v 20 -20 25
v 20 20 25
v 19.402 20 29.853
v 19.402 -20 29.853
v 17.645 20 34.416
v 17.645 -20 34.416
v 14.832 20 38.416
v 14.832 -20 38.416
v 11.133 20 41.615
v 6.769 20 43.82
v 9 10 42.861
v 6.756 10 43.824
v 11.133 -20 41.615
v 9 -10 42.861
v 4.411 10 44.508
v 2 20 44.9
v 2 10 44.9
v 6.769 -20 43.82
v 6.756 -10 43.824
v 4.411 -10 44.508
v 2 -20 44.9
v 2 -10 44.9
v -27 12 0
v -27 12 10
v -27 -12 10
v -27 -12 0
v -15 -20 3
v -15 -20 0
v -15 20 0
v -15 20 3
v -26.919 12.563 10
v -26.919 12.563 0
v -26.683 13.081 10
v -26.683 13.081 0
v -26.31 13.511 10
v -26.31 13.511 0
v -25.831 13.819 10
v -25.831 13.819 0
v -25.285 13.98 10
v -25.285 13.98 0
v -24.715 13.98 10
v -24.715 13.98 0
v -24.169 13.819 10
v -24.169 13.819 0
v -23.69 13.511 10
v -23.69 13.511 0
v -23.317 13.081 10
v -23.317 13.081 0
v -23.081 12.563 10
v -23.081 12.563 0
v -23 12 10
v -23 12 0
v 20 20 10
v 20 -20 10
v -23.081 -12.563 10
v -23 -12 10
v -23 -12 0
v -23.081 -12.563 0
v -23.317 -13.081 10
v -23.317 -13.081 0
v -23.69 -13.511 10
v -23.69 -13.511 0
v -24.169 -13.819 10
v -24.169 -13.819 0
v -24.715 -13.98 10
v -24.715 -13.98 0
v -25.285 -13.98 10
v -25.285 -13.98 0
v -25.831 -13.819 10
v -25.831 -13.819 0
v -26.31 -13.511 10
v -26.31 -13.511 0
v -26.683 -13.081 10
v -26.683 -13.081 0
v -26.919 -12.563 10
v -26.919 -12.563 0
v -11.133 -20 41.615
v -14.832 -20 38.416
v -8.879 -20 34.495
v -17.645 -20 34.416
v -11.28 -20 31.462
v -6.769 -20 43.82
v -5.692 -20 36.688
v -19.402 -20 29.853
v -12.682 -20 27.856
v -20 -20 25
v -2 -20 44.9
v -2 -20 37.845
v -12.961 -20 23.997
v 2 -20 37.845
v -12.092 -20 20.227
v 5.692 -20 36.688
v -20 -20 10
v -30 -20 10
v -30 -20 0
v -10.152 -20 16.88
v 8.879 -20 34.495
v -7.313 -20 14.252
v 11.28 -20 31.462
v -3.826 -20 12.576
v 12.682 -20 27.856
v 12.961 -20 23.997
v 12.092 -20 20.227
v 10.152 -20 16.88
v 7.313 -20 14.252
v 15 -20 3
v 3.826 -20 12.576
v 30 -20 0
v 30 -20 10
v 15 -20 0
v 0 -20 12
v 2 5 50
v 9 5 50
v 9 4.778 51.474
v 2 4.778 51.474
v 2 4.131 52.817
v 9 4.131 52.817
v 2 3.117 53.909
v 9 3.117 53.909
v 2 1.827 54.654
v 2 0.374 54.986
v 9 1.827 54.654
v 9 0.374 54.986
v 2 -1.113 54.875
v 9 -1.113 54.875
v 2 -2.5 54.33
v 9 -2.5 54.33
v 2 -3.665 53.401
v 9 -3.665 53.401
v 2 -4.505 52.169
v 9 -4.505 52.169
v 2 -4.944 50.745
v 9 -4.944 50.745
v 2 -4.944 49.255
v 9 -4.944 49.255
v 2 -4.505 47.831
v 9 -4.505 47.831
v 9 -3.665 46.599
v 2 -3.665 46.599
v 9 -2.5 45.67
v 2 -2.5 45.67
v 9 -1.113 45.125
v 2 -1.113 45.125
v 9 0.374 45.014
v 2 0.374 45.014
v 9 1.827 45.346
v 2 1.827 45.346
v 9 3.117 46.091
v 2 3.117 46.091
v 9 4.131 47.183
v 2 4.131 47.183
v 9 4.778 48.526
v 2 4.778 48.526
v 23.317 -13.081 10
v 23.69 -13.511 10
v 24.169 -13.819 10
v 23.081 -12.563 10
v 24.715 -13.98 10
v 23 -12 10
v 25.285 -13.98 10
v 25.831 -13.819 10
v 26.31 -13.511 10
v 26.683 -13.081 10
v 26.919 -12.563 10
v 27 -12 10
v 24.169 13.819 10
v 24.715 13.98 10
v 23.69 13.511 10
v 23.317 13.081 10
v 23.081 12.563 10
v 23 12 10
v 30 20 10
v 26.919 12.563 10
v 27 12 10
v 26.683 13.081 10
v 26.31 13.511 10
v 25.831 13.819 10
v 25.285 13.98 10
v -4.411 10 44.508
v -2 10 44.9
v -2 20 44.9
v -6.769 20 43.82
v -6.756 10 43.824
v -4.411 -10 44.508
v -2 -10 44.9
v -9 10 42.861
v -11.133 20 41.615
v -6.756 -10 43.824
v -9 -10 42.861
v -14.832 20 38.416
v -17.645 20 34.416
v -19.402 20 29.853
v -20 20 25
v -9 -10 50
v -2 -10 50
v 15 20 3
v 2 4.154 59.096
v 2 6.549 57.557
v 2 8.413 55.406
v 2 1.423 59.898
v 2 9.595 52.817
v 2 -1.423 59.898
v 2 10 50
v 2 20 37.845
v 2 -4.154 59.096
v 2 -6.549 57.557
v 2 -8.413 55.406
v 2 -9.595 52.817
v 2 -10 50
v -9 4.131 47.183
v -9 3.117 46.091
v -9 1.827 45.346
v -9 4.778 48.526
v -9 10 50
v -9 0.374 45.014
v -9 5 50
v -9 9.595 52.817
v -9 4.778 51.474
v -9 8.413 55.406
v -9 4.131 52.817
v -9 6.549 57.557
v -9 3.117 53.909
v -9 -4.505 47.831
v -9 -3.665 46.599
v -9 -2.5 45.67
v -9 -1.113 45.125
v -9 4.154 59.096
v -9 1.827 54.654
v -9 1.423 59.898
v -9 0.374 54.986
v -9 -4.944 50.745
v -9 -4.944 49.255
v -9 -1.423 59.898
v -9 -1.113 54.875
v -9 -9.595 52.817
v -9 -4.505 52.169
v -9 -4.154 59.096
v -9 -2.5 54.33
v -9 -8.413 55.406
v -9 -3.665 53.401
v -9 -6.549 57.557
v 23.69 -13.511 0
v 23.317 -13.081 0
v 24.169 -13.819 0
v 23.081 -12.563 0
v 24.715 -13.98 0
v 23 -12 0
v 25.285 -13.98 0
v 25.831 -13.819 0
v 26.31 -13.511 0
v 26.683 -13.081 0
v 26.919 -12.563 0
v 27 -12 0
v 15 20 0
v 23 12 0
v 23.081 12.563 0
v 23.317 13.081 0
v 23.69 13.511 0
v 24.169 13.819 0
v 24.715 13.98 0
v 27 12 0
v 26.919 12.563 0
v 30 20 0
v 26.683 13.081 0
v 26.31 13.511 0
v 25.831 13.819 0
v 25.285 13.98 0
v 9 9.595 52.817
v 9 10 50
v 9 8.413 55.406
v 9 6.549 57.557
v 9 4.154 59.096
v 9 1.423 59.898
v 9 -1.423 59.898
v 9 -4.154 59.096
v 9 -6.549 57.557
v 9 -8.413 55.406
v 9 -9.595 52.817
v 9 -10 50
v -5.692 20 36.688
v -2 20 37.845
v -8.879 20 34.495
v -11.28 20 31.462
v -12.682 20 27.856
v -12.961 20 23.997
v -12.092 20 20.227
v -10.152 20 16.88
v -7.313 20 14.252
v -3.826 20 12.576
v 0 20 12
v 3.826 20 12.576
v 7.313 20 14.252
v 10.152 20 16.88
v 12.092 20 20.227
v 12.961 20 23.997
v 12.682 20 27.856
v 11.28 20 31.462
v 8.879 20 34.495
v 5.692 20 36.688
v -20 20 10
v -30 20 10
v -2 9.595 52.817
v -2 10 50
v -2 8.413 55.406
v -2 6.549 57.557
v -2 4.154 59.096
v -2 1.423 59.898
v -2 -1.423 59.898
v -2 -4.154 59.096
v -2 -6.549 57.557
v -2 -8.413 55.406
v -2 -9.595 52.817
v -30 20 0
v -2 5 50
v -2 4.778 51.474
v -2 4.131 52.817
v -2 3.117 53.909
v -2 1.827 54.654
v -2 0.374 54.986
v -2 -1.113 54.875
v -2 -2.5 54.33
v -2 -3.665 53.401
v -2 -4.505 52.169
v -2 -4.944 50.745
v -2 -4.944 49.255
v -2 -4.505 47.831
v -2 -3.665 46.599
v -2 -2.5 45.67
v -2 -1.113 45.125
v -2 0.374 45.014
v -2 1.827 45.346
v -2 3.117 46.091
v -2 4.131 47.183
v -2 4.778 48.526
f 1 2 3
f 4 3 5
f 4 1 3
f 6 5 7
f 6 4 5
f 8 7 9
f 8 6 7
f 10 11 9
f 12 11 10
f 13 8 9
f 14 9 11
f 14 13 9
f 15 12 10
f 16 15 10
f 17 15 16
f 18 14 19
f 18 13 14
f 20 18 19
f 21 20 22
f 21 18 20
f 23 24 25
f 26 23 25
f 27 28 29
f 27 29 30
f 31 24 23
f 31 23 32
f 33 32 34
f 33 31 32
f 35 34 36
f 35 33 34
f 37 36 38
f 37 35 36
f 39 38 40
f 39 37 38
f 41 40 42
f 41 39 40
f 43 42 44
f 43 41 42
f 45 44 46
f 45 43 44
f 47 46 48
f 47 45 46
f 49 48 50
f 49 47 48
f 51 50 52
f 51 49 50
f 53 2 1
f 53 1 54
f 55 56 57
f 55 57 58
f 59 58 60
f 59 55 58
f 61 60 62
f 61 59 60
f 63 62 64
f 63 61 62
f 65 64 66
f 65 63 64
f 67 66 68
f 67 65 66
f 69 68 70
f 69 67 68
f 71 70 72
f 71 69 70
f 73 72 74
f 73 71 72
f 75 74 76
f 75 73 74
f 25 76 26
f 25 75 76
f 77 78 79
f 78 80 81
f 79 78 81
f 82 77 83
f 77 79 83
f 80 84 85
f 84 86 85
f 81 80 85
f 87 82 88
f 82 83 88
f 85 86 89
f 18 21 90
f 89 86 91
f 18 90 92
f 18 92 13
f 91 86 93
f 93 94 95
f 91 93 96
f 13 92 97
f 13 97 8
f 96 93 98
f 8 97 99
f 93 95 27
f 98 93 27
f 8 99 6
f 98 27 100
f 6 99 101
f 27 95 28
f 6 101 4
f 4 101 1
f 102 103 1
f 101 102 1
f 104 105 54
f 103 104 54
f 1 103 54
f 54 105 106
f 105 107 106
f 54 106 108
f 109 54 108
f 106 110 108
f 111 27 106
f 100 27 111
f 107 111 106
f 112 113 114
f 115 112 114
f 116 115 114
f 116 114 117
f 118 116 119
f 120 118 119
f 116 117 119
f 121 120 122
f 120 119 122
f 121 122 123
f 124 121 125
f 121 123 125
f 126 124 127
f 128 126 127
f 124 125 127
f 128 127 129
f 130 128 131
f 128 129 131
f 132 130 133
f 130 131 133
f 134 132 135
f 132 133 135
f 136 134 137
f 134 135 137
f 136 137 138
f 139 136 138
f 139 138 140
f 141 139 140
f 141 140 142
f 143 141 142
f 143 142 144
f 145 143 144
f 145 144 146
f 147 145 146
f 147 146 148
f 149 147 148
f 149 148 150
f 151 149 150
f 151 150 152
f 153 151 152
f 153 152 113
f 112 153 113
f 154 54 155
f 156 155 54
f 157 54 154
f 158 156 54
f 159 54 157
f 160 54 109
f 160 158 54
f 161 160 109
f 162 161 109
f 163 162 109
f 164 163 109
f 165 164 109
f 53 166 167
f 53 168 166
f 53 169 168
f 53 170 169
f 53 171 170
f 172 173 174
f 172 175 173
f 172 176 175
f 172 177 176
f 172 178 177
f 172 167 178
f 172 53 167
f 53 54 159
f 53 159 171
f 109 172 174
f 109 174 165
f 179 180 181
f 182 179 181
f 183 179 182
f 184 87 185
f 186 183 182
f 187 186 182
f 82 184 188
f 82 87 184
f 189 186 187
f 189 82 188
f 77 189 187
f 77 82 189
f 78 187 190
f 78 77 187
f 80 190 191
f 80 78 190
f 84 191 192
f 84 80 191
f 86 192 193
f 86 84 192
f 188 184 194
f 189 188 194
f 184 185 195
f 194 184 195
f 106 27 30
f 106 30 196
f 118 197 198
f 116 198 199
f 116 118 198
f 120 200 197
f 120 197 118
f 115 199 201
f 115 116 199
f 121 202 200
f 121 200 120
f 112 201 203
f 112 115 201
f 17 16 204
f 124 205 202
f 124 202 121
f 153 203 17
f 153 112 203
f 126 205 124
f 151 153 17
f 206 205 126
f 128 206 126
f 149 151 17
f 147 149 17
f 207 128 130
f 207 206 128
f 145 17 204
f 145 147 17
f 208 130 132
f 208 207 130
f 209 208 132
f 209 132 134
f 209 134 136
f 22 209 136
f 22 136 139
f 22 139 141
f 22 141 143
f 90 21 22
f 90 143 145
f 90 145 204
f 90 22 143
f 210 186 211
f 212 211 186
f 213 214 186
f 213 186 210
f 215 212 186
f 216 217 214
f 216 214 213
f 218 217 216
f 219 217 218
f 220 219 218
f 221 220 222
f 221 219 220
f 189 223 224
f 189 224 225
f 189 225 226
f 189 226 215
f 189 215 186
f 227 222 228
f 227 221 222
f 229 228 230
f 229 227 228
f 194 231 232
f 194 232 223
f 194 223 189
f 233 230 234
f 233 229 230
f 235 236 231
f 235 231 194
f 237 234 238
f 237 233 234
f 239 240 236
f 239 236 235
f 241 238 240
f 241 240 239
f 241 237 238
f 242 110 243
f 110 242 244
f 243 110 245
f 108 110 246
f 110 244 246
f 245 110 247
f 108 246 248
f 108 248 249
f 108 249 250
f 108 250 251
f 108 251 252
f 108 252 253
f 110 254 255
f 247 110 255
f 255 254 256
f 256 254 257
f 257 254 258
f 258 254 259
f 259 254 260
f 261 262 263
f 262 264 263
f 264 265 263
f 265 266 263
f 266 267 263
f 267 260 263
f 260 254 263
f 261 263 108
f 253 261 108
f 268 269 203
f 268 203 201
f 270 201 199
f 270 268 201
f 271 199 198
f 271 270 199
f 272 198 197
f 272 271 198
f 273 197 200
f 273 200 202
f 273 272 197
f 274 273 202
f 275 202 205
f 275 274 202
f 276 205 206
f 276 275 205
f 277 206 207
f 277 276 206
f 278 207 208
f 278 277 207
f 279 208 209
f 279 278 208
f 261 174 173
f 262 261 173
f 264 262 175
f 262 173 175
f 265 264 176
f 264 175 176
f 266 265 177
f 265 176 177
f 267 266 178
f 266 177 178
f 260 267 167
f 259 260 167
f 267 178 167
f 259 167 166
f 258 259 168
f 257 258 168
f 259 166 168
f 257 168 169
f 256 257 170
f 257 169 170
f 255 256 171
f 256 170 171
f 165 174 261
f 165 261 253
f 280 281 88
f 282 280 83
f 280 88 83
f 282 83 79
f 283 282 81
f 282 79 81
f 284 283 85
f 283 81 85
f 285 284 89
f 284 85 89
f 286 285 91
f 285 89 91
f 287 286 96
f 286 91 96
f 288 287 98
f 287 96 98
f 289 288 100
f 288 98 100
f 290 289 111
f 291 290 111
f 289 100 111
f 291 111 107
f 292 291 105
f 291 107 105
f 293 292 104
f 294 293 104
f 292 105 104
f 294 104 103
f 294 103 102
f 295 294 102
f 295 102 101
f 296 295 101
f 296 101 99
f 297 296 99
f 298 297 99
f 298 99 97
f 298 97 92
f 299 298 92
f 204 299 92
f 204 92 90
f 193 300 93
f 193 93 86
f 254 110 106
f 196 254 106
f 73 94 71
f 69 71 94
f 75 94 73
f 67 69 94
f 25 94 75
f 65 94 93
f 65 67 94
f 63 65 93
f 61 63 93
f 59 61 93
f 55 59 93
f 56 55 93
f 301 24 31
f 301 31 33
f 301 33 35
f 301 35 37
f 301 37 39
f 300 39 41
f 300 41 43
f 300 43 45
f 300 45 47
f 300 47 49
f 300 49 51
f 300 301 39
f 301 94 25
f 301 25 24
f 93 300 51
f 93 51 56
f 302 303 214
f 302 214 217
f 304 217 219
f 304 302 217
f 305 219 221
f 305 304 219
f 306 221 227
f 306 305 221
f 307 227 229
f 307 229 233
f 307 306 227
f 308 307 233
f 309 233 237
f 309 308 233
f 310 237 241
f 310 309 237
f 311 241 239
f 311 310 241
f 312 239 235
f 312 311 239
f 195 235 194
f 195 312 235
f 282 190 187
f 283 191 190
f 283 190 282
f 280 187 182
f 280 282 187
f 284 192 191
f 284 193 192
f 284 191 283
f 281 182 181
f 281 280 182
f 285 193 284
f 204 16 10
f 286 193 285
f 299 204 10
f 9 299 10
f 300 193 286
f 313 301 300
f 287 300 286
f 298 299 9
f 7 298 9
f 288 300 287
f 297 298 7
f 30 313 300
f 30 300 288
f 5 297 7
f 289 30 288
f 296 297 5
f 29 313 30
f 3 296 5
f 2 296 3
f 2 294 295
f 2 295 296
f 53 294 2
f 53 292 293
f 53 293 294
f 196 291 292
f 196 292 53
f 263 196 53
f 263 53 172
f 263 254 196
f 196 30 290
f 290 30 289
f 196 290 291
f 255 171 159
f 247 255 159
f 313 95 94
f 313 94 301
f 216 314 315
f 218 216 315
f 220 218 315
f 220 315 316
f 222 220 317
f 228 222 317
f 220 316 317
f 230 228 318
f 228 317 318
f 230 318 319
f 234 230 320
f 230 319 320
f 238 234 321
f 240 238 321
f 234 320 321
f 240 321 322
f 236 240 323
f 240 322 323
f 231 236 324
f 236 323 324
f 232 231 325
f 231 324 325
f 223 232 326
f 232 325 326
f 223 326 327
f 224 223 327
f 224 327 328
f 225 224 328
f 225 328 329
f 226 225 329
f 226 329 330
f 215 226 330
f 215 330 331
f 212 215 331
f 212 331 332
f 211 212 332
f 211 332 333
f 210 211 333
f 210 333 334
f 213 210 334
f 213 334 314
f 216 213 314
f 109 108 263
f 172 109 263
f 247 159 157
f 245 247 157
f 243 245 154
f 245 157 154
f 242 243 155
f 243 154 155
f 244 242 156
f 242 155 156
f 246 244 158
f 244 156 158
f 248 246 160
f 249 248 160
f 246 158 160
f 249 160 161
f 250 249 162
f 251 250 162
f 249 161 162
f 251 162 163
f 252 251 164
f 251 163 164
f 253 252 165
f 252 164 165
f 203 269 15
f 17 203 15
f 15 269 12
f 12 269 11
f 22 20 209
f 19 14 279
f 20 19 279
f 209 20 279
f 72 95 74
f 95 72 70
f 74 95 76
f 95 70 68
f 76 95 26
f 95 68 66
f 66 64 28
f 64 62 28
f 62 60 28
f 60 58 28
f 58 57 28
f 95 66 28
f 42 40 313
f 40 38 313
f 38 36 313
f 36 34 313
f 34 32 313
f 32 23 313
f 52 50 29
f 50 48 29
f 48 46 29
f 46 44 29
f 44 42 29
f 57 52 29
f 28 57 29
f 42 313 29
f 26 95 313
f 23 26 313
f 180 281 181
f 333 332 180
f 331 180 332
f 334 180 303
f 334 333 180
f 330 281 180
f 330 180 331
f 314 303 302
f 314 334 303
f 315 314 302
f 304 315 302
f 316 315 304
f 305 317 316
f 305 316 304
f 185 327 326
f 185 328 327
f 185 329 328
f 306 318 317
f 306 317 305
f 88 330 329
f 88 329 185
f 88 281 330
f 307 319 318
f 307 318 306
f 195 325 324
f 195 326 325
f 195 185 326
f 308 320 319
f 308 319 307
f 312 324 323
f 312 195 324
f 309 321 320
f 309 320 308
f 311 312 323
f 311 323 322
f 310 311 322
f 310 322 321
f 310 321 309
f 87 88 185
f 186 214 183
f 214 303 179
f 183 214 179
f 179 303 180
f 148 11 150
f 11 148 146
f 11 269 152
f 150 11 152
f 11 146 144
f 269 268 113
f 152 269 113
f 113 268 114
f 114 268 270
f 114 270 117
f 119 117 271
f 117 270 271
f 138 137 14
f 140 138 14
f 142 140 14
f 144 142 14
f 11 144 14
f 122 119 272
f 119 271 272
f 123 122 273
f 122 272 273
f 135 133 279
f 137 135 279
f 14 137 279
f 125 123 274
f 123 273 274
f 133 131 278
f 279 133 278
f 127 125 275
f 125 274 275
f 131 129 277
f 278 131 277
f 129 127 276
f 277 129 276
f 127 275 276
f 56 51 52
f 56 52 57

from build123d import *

# Parameters (mm, degrees)
SKETCH_W        = 60
SKETCH_H        = 40
PAD_DEPTH       = 10
PAD001_DEPTH    = 20
PAD002_DEPTH    = 9
SKETCH003_R     = 5
POCKET_DEPTH    = 39.001
POCKET001_DEPTH = 40.001
POCKET002_DEPTH = 197.61763
SKETCH006_W     = 30
SKETCH006_H     = 3
POCKET003_DEPTH = 40.001


with BuildPart() as part:
    # Sketch → Pad (new body)
    with BuildSketch(Plane.XY):
        Rectangle(SKETCH_W, SKETCH_H)
    extrude(amount=PAD_DEPTH)

    # Sketch001 → Pad001 (join, symmetric)
    with BuildSketch(Plane.XZ):
        with BuildLine():
            Line((20, 25), (20, 10))
            Line((20, 10), (-20, 10))
            Line((-20, 10), (-20, 25))
            ThreePointArc((20, 25), (0, 45), (-20, 25))
        make_face()
    extrude(amount=PAD001_DEPTH, both=True)

    # Sketch002 → Pad002 (join, symmetric)
    with BuildSketch(Plane.YZ):
        with BuildLine():
            Line((-10, 23), (-10, 50))
            ThreePointArc((10, 50), (0, 60), (-10, 50))
            Line((10, 50), (10, 23))
            Line((10, 23), (-10, 23))
        make_face()
    extrude(amount=PAD002_DEPTH, both=True)

    # Sketch003 (on Face15 of Pad002) → Pocket (cut, through all)
    with BuildSketch(Plane.YZ.offset(9)):
        with Locations((0, 50)):
            Circle(SKETCH003_R)
    extrude(amount=-POCKET_DEPTH, mode=Mode.SUBTRACT)

    # Sketch004 (on Face12 of Pocket) → Pocket001 (cut, through all)
    with BuildSketch(Plane.XZ.offset(20)):
        with BuildLine():
            ThreePointArc((-2, 37.845233), (0, 12), (2, 37.845233))
            Line((2, 70), (2, 37.845233))
            Line((-2, 70), (2, 70))
            Line((-2, 37.845233), (-2, 70))
        make_face()
    extrude(amount=-POCKET001_DEPTH, mode=Mode.SUBTRACT)

    # Sketch005 (on Face7 of Pocket001) → Pocket002 (cut, through all)
    with BuildSketch(Plane.XY.offset(10)):
        with BuildLine():
            ThreePointArc((27, 12), (25, 14), (23, 12))
            Line((23, 12), (23, -12))
            ThreePointArc((23, -12), (25, -14), (27, -12))
            Line((27, 12), (27, -12))
        make_face()
    pocket002 = extrude(amount=-POCKET002_DEPTH, mode=Mode.SUBTRACT)

    # Mirrored: Pocket002 across Sketch005 V_Axis
    add(pocket002.mirror(Plane(origin=(0, 0, 10), x_dir=(0, 0, 1), z_dir=(1, 0, 0))), mode=Mode.SUBTRACT)

    # Sketch006 (on Face8 of Mirrored) → Pocket003 (cut, through all)
    with BuildSketch(Plane.XZ.offset(20)):
        with Locations((0, 1.5)):
            Rectangle(SKETCH006_W, SKETCH006_H)
    extrude(amount=-POCKET003_DEPTH, mode=Mode.SUBTRACT)


solid = part.part
